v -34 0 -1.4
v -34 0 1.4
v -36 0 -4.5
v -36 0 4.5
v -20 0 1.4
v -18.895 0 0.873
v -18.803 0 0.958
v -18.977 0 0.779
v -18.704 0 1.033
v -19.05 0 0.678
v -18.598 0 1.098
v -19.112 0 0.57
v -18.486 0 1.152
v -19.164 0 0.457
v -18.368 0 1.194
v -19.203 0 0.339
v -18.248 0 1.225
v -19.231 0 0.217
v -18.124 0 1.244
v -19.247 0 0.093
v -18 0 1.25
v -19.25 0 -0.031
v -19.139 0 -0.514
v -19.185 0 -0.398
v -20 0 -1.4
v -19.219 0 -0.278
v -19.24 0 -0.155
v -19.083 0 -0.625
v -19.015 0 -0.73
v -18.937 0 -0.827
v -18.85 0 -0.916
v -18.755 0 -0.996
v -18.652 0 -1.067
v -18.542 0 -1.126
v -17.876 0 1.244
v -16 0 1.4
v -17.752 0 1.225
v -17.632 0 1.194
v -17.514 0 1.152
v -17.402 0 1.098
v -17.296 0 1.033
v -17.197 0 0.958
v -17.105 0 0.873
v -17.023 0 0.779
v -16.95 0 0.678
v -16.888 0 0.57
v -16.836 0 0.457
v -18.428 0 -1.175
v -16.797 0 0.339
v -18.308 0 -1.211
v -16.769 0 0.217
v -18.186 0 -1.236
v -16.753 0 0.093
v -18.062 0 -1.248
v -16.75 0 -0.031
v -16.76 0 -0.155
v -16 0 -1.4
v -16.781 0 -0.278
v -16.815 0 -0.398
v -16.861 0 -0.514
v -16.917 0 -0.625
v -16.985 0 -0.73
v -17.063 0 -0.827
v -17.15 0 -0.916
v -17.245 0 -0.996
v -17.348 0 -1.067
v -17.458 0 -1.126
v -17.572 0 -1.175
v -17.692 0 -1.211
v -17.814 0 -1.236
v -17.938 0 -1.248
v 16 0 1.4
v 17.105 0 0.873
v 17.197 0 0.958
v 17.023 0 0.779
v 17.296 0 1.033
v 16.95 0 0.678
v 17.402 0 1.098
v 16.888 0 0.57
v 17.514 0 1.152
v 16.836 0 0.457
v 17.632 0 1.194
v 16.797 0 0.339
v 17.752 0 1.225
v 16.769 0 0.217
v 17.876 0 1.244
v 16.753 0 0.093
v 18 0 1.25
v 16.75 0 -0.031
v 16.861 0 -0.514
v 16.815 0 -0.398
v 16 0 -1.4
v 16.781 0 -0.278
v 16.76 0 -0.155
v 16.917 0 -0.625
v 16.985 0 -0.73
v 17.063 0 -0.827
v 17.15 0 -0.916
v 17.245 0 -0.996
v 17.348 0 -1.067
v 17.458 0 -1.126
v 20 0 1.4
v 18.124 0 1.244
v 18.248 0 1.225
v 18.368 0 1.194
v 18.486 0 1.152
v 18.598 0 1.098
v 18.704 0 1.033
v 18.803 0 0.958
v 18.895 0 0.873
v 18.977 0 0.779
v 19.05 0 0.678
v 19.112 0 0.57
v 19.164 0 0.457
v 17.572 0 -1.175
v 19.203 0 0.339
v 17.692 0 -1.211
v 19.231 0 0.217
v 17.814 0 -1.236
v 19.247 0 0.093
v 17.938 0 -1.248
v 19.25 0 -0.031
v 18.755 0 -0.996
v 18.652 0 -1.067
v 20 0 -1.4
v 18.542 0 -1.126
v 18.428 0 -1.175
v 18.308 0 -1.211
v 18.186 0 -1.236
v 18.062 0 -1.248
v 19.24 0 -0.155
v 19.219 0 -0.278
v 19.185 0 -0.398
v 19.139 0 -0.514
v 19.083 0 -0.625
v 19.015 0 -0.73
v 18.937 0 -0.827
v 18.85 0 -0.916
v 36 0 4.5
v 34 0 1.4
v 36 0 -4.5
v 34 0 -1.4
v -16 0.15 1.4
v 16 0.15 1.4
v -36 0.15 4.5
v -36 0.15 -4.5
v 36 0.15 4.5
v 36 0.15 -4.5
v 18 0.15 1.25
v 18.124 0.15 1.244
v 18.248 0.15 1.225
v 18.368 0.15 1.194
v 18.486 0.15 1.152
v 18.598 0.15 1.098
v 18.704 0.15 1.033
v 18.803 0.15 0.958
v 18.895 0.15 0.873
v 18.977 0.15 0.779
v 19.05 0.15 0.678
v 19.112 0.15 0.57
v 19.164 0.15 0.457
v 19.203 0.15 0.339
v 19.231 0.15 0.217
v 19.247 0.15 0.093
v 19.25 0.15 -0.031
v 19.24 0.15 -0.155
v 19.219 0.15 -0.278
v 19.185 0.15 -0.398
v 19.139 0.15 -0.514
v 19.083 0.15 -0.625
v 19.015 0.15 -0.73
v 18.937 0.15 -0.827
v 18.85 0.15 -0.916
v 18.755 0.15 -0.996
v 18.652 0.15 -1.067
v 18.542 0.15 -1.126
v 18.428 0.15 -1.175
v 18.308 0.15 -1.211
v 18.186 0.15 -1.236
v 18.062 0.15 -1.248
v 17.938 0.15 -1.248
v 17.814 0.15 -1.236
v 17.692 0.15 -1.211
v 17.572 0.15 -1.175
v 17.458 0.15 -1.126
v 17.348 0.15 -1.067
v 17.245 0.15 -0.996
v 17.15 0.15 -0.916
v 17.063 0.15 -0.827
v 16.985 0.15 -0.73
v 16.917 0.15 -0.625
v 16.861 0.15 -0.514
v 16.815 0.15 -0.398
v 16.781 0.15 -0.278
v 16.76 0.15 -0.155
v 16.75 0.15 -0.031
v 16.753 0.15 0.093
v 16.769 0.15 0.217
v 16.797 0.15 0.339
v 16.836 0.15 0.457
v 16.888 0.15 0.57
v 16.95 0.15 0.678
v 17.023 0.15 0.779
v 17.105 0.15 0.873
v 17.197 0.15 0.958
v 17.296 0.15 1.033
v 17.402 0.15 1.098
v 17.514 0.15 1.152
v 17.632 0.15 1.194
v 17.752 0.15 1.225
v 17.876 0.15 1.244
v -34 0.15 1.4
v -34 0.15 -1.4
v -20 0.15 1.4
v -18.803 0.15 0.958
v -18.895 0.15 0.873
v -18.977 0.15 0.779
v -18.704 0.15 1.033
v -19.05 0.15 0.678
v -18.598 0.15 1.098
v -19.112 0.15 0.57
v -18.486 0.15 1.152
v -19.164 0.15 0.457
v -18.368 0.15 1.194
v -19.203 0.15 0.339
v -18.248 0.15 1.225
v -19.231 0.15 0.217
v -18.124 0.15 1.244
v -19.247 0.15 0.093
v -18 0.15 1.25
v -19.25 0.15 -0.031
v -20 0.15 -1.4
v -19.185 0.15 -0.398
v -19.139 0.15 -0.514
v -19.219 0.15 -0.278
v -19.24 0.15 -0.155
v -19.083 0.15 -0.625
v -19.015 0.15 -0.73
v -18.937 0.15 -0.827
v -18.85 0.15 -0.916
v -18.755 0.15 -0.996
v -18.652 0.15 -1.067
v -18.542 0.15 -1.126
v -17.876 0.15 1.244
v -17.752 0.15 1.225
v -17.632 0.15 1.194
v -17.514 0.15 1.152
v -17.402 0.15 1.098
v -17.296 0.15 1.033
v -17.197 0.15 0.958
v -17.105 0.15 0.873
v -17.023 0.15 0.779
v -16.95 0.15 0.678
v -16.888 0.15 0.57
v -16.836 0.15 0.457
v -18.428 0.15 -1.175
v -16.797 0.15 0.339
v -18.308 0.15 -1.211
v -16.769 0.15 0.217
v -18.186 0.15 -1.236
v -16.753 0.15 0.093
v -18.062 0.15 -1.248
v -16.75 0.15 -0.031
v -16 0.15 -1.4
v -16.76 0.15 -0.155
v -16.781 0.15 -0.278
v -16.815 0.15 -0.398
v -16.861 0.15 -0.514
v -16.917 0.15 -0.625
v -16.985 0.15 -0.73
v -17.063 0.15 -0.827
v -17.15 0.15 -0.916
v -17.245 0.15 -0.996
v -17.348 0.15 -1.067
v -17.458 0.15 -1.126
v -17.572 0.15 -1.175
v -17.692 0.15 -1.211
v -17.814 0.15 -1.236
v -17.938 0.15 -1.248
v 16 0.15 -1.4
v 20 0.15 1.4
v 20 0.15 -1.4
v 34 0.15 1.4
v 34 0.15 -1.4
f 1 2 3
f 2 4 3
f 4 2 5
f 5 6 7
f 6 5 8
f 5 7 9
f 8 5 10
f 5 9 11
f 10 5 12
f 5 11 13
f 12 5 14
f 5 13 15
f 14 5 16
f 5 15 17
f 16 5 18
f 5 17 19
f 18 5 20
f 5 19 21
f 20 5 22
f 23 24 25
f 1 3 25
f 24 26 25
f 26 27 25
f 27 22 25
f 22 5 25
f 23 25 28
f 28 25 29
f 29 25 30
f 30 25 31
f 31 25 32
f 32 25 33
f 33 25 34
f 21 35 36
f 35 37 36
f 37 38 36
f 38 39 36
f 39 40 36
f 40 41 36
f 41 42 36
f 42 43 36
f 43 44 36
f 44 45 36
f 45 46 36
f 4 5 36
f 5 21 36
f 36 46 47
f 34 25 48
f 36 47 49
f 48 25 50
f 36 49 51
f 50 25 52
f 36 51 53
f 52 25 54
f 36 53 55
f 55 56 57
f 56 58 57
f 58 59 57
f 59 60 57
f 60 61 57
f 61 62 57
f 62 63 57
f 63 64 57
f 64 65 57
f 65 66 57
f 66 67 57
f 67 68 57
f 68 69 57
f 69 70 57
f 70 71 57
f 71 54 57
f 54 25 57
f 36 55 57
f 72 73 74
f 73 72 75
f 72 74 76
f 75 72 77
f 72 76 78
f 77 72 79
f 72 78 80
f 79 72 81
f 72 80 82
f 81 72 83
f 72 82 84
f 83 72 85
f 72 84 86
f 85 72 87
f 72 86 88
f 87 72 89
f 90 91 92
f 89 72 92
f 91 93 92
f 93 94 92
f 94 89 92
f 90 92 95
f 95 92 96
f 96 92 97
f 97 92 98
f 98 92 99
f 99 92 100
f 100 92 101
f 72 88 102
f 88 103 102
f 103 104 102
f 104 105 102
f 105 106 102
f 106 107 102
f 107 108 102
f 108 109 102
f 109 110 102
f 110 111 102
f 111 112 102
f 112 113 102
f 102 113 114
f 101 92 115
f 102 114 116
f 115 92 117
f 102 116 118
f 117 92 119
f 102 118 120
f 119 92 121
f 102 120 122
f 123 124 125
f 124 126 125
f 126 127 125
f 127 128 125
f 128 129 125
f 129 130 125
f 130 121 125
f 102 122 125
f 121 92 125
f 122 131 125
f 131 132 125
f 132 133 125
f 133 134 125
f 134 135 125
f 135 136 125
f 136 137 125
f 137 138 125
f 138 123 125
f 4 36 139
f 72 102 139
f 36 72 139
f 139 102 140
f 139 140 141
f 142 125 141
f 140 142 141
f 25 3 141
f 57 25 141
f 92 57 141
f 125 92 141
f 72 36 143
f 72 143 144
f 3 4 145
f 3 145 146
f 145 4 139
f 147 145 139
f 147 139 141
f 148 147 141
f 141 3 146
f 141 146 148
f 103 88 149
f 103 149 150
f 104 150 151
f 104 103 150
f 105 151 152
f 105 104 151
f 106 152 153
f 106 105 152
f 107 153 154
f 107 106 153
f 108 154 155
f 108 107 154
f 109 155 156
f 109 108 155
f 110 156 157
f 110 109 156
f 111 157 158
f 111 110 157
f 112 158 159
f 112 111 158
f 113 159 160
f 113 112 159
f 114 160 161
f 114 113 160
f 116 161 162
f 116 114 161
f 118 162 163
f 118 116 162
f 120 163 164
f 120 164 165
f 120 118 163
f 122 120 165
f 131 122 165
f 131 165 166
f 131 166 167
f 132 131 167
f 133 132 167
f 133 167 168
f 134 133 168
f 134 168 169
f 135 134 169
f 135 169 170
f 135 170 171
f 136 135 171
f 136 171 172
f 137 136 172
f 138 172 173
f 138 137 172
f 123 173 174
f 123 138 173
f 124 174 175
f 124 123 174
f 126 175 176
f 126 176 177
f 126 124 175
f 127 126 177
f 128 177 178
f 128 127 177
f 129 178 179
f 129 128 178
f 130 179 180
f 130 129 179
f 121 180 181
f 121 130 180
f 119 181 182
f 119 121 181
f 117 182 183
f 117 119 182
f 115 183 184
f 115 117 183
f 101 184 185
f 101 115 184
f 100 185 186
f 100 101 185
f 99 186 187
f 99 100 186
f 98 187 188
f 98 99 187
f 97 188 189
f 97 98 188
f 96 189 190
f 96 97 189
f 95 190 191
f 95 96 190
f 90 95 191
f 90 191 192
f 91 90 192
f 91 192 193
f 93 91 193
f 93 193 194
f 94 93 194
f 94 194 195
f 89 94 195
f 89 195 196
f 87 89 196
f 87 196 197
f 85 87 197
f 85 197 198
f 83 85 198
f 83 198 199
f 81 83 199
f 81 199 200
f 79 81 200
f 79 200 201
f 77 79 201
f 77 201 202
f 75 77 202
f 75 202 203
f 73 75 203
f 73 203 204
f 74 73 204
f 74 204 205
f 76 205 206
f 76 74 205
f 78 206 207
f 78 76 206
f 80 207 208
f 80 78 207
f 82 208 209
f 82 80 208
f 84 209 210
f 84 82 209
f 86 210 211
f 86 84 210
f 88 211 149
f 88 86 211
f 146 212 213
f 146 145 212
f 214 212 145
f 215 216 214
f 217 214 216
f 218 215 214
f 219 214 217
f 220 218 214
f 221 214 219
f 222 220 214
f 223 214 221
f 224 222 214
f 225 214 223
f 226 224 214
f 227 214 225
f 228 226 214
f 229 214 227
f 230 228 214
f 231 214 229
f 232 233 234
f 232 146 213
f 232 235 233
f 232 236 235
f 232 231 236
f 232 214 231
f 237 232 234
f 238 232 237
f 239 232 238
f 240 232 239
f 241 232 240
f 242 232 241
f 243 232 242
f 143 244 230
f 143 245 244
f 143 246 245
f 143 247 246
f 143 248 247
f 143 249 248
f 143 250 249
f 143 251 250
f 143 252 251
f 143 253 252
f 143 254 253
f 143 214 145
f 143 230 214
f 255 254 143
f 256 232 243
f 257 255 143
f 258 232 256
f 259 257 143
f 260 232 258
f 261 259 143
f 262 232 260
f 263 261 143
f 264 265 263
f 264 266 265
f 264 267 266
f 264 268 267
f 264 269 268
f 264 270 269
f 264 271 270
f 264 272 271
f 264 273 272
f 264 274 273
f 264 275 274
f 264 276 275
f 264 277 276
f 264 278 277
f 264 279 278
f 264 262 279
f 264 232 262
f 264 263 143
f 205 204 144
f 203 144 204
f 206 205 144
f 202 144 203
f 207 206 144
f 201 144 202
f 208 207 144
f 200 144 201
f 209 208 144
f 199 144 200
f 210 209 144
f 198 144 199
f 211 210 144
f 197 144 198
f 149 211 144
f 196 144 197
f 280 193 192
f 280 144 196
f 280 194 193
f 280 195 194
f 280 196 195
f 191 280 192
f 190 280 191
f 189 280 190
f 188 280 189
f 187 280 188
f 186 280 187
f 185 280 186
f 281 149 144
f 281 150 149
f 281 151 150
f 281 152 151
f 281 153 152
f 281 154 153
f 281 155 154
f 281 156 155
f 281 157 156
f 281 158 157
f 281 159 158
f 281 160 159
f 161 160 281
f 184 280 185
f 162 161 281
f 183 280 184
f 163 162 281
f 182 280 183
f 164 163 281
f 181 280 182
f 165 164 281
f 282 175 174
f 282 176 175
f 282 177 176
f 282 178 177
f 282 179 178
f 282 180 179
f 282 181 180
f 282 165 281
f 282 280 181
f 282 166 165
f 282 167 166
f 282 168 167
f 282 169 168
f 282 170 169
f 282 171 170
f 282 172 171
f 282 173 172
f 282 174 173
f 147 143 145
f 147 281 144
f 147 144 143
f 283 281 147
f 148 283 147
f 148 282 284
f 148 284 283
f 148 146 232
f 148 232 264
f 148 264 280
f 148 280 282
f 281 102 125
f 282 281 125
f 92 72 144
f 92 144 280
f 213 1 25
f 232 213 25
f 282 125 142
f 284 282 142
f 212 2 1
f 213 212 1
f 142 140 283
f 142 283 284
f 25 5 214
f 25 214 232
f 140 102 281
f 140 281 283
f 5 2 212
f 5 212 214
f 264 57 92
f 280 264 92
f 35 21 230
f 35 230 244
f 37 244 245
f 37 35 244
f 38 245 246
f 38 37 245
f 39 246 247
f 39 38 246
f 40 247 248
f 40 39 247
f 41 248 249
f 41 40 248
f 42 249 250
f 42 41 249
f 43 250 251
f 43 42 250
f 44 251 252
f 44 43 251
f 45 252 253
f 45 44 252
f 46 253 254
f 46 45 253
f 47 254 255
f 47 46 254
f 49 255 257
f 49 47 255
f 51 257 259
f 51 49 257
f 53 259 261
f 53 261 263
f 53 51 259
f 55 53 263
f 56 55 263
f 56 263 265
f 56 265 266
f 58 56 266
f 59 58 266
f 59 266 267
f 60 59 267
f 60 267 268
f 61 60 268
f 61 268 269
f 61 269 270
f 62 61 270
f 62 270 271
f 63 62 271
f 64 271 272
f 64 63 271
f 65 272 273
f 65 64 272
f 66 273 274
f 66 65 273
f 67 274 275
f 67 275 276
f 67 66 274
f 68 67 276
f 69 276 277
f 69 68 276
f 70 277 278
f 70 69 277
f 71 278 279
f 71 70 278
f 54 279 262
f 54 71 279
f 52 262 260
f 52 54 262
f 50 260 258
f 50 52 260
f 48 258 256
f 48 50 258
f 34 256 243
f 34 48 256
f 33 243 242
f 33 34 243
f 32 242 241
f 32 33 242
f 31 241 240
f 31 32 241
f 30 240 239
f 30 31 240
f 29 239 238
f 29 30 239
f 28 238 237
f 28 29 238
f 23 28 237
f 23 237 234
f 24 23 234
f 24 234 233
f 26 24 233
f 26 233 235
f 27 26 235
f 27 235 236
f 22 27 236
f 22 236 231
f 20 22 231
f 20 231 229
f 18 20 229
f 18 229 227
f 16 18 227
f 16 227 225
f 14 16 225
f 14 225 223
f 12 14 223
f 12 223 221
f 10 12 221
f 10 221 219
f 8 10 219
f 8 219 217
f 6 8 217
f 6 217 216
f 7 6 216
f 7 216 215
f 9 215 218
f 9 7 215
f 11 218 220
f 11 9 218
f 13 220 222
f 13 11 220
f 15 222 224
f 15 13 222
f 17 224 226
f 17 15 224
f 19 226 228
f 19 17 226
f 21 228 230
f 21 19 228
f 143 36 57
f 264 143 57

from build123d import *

# Parameters (mm, degrees)
SKETCH1_W           = 72
SKETCH1_H           = 9
SKETCH1_R           = 1.25
SKETCH1_W_2         = 14
SKETCH1_H_2         = 2.8
SKETCH1_W_3         = 32
BOSS_EXTRUDE1_DEPTH = 0.15


with BuildPart() as part:
    # Sketch1 → Boss-Extrude1 (new body)
    with BuildSketch(Plane(origin=(0, 0, 0), x_dir=(1, 0, 0), z_dir=(0, 1, 0))):
        Rectangle(SKETCH1_W, SKETCH1_H)
        with Locations(Location((-18, 0, 0), (0, 0, 270))):
            Circle(SKETCH1_R, mode=Mode.SUBTRACT)
        with Locations(Location((18, 0, 0), (0, 0, 270))):
            Circle(SKETCH1_R, mode=Mode.SUBTRACT)
        with Locations((27, 0)):
            Rectangle(SKETCH1_W_2, SKETCH1_H_2, mode=Mode.SUBTRACT)
        Rectangle(SKETCH1_W_3, SKETCH1_H_2, mode=Mode.SUBTRACT)
        with Locations((-27, 0)):
            Rectangle(SKETCH1_W_2, SKETCH1_H_2, mode=Mode.SUBTRACT)
    extrude(amount=BOSS_EXTRUDE1_DEPTH)


solid = part.part
